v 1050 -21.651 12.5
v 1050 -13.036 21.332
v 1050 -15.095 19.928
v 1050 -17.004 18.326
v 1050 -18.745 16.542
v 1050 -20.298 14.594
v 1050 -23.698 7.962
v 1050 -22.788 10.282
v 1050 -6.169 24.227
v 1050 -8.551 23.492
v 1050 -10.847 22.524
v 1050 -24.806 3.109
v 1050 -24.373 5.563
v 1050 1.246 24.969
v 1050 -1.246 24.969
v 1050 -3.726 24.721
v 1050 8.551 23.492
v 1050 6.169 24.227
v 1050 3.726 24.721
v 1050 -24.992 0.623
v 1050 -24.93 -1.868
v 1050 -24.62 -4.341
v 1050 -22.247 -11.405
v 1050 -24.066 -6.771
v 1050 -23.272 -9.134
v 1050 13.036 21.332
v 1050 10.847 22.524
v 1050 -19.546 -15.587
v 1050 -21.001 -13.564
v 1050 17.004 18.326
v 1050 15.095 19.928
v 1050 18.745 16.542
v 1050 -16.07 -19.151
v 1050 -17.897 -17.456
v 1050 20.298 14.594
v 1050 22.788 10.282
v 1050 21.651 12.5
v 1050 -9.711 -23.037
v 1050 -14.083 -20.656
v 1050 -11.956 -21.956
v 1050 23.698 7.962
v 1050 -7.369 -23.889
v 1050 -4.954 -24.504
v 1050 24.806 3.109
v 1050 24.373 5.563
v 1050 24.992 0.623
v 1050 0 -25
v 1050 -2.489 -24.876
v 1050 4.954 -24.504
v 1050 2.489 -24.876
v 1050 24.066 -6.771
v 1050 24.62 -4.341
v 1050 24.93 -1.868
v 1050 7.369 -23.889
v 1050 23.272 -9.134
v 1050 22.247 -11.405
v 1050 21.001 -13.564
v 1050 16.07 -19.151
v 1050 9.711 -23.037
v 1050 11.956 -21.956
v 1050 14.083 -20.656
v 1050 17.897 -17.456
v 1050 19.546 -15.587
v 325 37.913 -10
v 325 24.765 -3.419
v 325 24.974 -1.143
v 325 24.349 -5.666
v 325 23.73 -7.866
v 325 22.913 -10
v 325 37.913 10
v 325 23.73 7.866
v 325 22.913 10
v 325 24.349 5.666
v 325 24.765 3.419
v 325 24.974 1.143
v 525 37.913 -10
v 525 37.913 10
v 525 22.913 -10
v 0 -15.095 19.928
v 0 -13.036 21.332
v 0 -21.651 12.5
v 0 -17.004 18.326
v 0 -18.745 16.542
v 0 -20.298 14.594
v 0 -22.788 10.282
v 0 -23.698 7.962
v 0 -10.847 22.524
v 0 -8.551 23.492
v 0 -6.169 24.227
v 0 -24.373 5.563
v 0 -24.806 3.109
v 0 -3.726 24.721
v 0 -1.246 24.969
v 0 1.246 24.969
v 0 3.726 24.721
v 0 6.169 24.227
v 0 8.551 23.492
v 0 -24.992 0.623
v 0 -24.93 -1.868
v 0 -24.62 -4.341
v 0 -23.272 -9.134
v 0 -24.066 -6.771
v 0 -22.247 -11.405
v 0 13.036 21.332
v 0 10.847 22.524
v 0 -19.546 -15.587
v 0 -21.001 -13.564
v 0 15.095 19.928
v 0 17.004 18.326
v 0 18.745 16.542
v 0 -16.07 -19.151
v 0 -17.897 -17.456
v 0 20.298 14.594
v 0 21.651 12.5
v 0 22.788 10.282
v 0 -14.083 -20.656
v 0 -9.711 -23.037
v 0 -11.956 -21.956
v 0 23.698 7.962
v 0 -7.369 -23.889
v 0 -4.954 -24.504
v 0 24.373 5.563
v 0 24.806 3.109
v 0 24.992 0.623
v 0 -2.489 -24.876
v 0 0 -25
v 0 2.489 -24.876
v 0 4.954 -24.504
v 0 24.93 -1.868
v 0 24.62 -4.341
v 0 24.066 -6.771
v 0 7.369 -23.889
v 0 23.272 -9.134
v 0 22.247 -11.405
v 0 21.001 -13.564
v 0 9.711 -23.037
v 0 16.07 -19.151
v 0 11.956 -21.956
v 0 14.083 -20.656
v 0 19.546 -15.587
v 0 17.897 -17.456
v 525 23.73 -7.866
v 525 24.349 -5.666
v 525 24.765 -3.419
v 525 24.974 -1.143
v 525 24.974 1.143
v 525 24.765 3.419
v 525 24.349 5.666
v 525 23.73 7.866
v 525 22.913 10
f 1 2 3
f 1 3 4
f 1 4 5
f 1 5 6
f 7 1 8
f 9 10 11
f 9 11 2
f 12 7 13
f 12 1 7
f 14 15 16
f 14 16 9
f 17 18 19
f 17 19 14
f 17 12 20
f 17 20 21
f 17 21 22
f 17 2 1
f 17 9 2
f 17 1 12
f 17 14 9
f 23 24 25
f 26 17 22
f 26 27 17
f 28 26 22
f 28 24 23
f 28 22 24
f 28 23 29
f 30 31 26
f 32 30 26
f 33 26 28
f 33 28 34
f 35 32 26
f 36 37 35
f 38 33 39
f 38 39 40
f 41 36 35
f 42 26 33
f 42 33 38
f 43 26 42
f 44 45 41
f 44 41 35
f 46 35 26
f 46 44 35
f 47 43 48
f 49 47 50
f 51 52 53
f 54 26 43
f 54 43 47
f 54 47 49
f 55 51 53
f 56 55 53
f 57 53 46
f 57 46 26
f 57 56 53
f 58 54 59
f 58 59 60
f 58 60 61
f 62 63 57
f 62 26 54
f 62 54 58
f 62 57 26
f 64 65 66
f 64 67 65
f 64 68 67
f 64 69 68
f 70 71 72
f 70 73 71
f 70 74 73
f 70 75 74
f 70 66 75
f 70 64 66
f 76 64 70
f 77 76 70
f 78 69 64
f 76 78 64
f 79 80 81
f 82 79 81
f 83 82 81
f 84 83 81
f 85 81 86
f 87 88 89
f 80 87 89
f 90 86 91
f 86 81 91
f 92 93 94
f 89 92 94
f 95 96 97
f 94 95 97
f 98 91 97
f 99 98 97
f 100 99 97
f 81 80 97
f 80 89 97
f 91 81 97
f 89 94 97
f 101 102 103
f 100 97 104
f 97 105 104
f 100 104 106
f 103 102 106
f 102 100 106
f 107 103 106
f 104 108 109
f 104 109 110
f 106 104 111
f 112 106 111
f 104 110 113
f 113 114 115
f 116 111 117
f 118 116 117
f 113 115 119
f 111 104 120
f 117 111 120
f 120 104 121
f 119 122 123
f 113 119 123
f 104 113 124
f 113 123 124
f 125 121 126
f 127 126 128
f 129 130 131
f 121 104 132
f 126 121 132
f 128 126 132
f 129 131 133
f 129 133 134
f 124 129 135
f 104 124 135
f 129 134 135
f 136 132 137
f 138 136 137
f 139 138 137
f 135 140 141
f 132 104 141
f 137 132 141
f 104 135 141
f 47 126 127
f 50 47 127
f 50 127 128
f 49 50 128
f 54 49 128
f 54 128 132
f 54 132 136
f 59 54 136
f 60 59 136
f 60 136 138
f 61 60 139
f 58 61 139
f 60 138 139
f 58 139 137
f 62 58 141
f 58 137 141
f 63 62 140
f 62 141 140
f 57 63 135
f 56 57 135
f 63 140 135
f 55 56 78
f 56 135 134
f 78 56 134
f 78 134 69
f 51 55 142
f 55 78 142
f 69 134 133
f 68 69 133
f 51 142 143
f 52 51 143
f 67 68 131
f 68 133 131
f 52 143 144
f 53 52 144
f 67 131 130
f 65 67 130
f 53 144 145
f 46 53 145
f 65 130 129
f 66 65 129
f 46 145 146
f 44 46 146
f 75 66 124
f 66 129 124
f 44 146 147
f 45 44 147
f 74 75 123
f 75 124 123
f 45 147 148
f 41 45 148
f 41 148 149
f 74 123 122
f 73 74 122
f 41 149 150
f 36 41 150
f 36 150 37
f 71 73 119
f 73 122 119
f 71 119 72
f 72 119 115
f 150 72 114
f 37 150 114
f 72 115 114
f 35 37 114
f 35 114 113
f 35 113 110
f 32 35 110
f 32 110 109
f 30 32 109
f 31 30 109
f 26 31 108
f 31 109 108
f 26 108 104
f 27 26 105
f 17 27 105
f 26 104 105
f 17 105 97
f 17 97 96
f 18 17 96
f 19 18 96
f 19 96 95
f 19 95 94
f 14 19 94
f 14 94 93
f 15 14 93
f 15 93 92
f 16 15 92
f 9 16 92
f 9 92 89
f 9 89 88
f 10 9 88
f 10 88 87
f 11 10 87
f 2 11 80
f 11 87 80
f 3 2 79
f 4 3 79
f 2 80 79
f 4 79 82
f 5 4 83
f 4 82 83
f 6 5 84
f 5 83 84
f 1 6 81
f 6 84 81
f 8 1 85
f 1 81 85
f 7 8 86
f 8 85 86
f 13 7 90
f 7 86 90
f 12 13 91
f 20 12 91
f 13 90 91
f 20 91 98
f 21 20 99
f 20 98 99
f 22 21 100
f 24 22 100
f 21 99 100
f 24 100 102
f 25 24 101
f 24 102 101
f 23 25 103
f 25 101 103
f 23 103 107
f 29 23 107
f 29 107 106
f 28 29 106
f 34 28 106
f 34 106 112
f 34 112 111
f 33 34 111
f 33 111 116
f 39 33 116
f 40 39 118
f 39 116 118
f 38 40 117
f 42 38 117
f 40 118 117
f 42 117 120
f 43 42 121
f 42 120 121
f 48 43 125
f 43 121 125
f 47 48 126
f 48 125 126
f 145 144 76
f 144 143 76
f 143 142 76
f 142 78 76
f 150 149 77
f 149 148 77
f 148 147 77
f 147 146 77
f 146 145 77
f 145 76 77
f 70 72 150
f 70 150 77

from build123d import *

# Parameters (mm, degrees)
SKETCH1_R           = 25
BOSS_EXTRUDE1_DEPTH = 1050
SKETCH2_W           = 20
SKETCH2_H           = 15
BOSS_EXTRUDE2_DEPTH = 200


with BuildPart() as part:
    # Sketch1 → Boss-Extrude1 (new body)
    with BuildSketch(Plane(origin=(0, 0, 0), x_dir=(0, 0, -1), z_dir=(1, 0, 0))):
        Circle(SKETCH1_R)
    extrude(amount=BOSS_EXTRUDE1_DEPTH)

    # Sketch2 → Boss-Extrude2 (add)
    with BuildSketch(Plane.ZY.offset(-325)):
        with Locations((0, 30.412878475)):
            Rectangle(SKETCH2_W, SKETCH2_H)
    extrude(amount=-BOSS_EXTRUDE2_DEPTH)


solid = part.part
